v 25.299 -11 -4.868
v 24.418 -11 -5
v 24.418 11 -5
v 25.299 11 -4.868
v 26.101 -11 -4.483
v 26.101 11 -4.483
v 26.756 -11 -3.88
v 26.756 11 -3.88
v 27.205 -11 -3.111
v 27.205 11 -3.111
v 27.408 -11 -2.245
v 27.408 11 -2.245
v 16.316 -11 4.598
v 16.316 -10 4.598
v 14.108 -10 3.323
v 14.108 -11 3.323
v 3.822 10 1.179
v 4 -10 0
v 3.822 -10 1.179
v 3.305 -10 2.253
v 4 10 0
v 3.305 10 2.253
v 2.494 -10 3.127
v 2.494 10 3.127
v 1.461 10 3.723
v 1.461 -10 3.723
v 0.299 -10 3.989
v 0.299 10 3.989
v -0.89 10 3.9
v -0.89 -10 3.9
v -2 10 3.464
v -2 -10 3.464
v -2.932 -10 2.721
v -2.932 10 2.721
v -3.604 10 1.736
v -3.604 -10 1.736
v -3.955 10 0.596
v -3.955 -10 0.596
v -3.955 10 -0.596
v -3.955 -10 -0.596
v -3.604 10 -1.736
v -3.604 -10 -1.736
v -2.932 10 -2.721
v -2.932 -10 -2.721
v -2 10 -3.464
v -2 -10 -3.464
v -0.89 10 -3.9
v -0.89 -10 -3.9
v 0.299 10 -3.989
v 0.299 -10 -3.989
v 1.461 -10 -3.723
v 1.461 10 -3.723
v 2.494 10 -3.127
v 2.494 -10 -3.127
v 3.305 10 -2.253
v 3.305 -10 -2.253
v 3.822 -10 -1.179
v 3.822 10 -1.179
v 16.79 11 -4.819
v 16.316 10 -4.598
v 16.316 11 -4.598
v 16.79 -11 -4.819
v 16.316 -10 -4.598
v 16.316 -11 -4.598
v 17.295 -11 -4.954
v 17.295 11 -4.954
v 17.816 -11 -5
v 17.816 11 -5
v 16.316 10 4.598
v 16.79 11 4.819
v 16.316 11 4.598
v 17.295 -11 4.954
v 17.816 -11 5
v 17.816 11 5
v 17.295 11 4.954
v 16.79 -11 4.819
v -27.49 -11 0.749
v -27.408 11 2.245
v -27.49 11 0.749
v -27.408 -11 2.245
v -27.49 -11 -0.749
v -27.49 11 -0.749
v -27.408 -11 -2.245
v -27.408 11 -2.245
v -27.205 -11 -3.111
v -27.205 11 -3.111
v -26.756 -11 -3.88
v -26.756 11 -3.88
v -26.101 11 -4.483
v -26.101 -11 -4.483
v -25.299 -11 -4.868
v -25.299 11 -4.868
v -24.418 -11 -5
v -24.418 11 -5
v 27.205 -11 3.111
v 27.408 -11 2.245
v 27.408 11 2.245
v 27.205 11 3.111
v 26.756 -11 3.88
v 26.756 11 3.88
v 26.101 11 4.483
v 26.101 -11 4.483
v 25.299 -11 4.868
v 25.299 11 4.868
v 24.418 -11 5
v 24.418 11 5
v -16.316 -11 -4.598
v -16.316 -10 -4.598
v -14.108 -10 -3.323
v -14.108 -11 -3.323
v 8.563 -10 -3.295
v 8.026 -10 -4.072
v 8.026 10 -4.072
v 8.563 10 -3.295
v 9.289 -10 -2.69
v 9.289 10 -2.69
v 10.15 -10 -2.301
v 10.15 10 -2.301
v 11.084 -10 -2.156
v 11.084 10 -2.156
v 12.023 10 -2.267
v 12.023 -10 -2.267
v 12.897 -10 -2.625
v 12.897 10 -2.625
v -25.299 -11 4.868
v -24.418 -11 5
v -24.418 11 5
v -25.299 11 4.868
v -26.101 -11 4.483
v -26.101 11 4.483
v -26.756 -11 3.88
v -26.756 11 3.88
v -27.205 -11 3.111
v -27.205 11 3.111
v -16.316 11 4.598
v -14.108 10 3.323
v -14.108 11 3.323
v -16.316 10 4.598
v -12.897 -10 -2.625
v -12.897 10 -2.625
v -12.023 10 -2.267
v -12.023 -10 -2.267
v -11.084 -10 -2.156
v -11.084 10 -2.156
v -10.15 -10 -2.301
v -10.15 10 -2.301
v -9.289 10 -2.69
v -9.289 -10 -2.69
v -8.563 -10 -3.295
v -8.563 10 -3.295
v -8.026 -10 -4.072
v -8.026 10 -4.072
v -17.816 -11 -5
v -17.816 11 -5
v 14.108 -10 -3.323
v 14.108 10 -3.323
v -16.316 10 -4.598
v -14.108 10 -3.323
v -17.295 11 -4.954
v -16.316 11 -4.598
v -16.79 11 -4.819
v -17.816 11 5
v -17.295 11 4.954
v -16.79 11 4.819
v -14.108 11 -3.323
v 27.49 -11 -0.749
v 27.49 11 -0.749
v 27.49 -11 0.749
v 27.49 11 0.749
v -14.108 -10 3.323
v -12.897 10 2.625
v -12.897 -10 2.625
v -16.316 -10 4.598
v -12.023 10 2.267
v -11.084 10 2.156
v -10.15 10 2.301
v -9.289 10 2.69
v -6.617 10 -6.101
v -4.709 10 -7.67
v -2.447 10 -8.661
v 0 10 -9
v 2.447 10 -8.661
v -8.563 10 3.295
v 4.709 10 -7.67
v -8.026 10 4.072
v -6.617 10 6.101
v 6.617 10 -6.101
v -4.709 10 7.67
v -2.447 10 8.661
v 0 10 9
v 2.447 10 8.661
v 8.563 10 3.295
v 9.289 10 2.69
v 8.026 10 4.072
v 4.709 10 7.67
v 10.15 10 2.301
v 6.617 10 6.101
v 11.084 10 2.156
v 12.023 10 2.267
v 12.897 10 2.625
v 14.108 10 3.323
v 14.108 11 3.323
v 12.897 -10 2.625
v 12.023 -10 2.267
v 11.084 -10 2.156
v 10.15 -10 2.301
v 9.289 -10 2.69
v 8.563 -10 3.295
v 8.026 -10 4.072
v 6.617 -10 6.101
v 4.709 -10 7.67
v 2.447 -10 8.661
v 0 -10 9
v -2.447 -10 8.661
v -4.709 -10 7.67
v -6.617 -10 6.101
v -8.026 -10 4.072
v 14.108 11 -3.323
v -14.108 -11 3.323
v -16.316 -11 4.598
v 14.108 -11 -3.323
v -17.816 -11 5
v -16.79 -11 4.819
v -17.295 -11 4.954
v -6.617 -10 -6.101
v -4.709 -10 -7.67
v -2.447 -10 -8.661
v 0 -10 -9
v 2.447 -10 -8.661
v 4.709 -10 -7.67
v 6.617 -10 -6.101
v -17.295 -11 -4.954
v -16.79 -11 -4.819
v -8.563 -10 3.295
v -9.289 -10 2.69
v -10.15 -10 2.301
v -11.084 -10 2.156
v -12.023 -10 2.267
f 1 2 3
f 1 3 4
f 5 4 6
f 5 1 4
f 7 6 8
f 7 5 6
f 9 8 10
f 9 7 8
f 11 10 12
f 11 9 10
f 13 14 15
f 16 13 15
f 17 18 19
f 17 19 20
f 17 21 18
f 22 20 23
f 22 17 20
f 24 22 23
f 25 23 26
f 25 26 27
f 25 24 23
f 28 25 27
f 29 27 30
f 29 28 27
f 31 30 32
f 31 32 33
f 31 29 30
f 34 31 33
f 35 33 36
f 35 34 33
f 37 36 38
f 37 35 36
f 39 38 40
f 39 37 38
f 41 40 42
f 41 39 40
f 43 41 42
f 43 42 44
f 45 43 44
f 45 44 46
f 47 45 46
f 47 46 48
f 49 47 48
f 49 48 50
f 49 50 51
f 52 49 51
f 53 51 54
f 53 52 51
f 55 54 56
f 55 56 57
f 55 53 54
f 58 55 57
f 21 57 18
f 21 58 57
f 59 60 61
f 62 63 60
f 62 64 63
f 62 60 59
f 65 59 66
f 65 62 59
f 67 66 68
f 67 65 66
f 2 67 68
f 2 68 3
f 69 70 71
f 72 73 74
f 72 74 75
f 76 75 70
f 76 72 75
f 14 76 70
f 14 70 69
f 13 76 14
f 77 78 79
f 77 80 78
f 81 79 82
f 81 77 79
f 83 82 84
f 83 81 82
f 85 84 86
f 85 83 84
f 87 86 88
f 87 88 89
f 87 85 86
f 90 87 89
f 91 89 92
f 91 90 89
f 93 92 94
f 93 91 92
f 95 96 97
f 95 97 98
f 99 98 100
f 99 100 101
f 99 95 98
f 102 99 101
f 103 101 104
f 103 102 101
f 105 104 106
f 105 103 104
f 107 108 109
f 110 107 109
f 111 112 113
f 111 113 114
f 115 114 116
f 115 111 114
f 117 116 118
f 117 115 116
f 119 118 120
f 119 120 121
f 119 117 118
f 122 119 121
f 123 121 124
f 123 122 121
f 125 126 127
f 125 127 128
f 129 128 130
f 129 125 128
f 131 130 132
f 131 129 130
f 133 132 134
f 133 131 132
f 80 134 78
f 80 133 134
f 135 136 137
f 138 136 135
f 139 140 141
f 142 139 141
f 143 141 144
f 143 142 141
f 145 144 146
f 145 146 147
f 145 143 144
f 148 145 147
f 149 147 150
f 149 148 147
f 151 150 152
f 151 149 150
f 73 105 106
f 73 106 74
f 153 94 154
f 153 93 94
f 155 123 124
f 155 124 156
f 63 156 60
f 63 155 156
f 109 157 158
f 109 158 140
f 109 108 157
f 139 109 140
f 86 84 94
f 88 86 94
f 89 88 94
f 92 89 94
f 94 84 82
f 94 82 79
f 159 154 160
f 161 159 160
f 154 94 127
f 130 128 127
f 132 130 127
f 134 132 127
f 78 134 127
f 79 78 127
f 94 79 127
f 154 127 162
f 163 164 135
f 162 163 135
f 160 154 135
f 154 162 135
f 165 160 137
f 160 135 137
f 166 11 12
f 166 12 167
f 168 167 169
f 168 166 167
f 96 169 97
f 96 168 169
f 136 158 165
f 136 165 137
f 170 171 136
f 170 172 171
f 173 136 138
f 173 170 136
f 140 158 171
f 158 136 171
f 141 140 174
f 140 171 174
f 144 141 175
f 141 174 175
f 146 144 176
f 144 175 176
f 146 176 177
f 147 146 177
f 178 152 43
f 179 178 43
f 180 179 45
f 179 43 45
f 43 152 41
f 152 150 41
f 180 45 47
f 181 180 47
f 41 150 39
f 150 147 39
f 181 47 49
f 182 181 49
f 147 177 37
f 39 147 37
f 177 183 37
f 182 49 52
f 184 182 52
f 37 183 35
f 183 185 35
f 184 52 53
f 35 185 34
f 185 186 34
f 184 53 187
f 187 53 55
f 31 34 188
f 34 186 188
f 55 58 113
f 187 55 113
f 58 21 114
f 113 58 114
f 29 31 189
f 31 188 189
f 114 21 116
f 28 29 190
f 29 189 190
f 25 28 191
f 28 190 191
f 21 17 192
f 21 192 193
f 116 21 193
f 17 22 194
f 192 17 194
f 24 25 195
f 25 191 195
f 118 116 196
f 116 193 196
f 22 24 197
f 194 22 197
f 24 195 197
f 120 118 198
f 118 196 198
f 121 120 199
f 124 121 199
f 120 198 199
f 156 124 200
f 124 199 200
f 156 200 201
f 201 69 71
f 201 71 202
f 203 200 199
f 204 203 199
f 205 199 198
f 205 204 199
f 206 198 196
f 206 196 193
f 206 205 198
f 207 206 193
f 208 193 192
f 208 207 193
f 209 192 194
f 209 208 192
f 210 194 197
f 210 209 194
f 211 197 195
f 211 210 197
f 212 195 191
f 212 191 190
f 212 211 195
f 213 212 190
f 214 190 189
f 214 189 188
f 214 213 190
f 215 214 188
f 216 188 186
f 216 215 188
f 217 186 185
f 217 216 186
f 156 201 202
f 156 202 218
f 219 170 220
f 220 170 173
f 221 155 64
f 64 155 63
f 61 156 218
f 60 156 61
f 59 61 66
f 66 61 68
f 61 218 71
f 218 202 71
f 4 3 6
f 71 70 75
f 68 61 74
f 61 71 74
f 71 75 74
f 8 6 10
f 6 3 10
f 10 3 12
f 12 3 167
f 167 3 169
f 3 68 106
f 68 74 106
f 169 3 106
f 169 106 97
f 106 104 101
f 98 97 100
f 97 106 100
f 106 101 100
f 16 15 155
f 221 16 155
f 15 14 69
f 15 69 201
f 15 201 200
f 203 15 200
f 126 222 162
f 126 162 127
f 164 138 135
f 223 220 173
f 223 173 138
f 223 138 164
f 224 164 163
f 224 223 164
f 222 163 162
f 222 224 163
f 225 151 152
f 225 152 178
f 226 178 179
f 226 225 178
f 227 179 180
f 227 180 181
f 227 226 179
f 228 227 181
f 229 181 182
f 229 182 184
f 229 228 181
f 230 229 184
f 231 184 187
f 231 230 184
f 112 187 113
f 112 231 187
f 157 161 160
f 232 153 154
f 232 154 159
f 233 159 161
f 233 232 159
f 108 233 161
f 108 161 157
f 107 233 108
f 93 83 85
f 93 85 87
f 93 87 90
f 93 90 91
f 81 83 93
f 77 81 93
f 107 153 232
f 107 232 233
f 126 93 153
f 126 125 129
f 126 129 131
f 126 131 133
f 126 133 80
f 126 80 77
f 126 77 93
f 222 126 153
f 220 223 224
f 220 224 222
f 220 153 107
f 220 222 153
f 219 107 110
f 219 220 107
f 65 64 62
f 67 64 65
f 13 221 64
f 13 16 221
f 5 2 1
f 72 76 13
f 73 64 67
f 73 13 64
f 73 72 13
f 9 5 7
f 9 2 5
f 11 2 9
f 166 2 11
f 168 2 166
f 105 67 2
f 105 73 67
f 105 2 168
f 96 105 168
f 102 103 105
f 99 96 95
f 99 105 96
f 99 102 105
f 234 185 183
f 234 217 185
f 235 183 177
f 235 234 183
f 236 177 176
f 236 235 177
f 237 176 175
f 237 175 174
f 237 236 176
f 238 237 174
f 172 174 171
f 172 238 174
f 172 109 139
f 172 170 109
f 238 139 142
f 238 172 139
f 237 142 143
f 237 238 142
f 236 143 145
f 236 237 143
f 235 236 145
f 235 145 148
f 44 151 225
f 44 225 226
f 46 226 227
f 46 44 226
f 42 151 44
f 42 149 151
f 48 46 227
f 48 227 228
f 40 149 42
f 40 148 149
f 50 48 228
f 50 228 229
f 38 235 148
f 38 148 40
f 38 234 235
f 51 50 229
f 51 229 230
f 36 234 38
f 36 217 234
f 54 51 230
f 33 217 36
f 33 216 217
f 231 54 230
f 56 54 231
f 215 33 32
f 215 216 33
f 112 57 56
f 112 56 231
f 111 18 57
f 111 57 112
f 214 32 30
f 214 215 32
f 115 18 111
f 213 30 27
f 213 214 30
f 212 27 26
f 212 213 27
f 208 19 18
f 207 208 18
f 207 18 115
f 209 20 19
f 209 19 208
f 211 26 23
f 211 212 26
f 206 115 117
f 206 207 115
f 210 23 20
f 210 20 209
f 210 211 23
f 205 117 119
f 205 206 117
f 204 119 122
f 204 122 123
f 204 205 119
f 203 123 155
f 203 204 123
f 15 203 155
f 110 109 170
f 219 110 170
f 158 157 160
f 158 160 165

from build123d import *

# Parameters (mm, degrees)
F0_R     = 4
F1_DEPTH = 10
F3_DEPTH = 1


# Not quite as in the source:
# - a pattern or mirror of a feature is missing from the dataset's text; its kind, count and spacing are read off the source's solid


with BuildPart() as f1:
    # F0 (on Front) → F1 (new body, symmetric)
    with BuildSketch(Plane.XZ):
        with BuildLine():
            ThreePointArc((-12.8973712231, -2.6245379145), (-10.1504183848, -2.3006178802), (-8.0261072806, -4.072051316))
            ThreePointArc((-8.0261072806, -4.072051316), (0, -9), (8.0261072806, -4.072051316))
            ThreePointArc((8.0261072806, -4.072051316), (10.1504183848, -2.3006178802), (12.8973712231, -2.6245379145))
            Line((12.8973712231, -2.6245379145), (16.315639824, -4.5980762114))
            ThreePointArc((16.315639824, -4.5980762114), (17.0391826887, -4.8977774789), (17.815639824, -5))
            Line((17.815639824, -5), (24.4182308941, -5))
            ThreePointArc((24.4182308941, -5), (26.4511236757, -4.2062064588), (27.4082183506, -2.2448979592))
            ThreePointArc((27.4082183506, -2.2448979592), (27.5, 0), (27.4082183506, 2.2448979592))
            ThreePointArc((27.4082183506, 2.2448979592), (26.4511236757, 4.2062064588), (24.4182308941, 5))
            Line((24.4182308941, 5), (17.815639824, 5))
            ThreePointArc((17.815639824, 5), (17.0391826887, 4.8977774789), (16.315639824, 4.5980762114))
            Line((16.315639824, 4.5980762114), (12.8973712231, 2.6245379145))
            ThreePointArc((12.8973712231, 2.6245379145), (10.1504183848, 2.3006178802), (8.0261072806, 4.072051316))
            ThreePointArc((8.0261072806, 4.072051316), (0, 9), (-8.0261072806, 4.072051316))
            ThreePointArc((-8.0261072806, 4.072051316), (-10.1504183848, 2.3006178802), (-12.8973712231, 2.6245379145))
            Line((-12.8973712231, 2.6245379145), (-16.315639824, 4.5980762114))
            ThreePointArc((-16.315639824, 4.5980762114), (-17.0391826887, 4.8977774789), (-17.815639824, 5))
            Line((-17.815639824, 5), (-24.4182308941, 5))
            ThreePointArc((-24.4182308941, 5), (-26.4511236757, 4.2062064588), (-27.4082183506, 2.2448979592))
            ThreePointArc((-27.4082183506, 2.2448979592), (-27.5, 0), (-27.4082183506, -2.2448979592))
            ThreePointArc((-27.4082183506, -2.2448979592), (-26.4511236757, -4.2062064588), (-24.4182308941, -5))
            Line((-24.4182308941, -5), (-17.815639824, -5))
            ThreePointArc((-17.815639824, -5), (-17.0391826887, -4.8977774789), (-16.315639824, -4.5980762114))
            Line((-16.315639824, -4.5980762114), (-12.8973712231, -2.6245379145))
        make_face()
        Circle(F0_R, mode=Mode.SUBTRACT)
    extrude(amount=F1_DEPTH, both=True)

    # F2 (on face) → F3 (join)
    with BuildSketch(Plane.XZ.offset(10)):
        with BuildLine():
            Line((-24.4182308941, -5), (-17.815639824, -5))
            ThreePointArc((-17.815639824, -5), (-17.0391826887, -4.8977774789), (-16.315639824, -4.5980762114))
            Line((-16.315639824, -4.5980762114), (-14.1075365245, -3.323227177))
            Line((-14.1075365245, -3.323227177), (-14.1075365245, 3.323227177))
            Line((-14.1075365245, 3.323227177), (-16.315639824, 4.5980762114))
            ThreePointArc((-16.315639824, 4.5980762114), (-17.0391826887, 4.8977774789), (-17.815639824, 5))
            Line((-17.815639824, 5), (-24.4182308941, 5))
            ThreePointArc((-24.4182308941, 5), (-26.4511236757, 4.2062064588), (-27.4082183506, 2.2448979592))
            ThreePointArc((-27.4082183506, 2.2448979592), (-27.5, 0), (-27.4082183506, -2.2448979592))
            ThreePointArc((-27.4082183506, -2.2448979592), (-26.4511236757, -4.2062064588), (-24.4182308941, -5))
        make_face()
        with BuildLine():
            Line((14.1075365245, -3.323227177), (16.315639824, -4.5980762114))
            ThreePointArc((16.315639824, -4.5980762114), (17.0391826887, -4.8977774789), (17.815639824, -5))
            Line((17.815639824, -5), (24.4182308941, -5))
            ThreePointArc((24.4182308941, -5), (26.4511236757, -4.2062064588), (27.4082183506, -2.2448979592))
            ThreePointArc((27.4082183506, -2.2448979592), (27.5, 0), (27.4082183506, 2.2448979592))
            ThreePointArc((27.4082183506, 2.2448979592), (26.4511236757, 4.2062064588), (24.4182308941, 5))
            Line((24.4182308941, 5), (17.815639824, 5))
            ThreePointArc((17.815639824, 5), (17.0391826887, 4.8977774789), (16.315639824, 4.5980762114))
            Line((16.315639824, 4.5980762114), (14.1075365245, 3.323227177))
            Line((14.1075365245, 3.323227177), (14.1075365245, -3.323227177))
        make_face()
    f3 = extrude(amount=F3_DEPTH)

    # F3_copies: F3 across plane
    add(f3.mirror(Plane.ZX))


solid = f1.part
